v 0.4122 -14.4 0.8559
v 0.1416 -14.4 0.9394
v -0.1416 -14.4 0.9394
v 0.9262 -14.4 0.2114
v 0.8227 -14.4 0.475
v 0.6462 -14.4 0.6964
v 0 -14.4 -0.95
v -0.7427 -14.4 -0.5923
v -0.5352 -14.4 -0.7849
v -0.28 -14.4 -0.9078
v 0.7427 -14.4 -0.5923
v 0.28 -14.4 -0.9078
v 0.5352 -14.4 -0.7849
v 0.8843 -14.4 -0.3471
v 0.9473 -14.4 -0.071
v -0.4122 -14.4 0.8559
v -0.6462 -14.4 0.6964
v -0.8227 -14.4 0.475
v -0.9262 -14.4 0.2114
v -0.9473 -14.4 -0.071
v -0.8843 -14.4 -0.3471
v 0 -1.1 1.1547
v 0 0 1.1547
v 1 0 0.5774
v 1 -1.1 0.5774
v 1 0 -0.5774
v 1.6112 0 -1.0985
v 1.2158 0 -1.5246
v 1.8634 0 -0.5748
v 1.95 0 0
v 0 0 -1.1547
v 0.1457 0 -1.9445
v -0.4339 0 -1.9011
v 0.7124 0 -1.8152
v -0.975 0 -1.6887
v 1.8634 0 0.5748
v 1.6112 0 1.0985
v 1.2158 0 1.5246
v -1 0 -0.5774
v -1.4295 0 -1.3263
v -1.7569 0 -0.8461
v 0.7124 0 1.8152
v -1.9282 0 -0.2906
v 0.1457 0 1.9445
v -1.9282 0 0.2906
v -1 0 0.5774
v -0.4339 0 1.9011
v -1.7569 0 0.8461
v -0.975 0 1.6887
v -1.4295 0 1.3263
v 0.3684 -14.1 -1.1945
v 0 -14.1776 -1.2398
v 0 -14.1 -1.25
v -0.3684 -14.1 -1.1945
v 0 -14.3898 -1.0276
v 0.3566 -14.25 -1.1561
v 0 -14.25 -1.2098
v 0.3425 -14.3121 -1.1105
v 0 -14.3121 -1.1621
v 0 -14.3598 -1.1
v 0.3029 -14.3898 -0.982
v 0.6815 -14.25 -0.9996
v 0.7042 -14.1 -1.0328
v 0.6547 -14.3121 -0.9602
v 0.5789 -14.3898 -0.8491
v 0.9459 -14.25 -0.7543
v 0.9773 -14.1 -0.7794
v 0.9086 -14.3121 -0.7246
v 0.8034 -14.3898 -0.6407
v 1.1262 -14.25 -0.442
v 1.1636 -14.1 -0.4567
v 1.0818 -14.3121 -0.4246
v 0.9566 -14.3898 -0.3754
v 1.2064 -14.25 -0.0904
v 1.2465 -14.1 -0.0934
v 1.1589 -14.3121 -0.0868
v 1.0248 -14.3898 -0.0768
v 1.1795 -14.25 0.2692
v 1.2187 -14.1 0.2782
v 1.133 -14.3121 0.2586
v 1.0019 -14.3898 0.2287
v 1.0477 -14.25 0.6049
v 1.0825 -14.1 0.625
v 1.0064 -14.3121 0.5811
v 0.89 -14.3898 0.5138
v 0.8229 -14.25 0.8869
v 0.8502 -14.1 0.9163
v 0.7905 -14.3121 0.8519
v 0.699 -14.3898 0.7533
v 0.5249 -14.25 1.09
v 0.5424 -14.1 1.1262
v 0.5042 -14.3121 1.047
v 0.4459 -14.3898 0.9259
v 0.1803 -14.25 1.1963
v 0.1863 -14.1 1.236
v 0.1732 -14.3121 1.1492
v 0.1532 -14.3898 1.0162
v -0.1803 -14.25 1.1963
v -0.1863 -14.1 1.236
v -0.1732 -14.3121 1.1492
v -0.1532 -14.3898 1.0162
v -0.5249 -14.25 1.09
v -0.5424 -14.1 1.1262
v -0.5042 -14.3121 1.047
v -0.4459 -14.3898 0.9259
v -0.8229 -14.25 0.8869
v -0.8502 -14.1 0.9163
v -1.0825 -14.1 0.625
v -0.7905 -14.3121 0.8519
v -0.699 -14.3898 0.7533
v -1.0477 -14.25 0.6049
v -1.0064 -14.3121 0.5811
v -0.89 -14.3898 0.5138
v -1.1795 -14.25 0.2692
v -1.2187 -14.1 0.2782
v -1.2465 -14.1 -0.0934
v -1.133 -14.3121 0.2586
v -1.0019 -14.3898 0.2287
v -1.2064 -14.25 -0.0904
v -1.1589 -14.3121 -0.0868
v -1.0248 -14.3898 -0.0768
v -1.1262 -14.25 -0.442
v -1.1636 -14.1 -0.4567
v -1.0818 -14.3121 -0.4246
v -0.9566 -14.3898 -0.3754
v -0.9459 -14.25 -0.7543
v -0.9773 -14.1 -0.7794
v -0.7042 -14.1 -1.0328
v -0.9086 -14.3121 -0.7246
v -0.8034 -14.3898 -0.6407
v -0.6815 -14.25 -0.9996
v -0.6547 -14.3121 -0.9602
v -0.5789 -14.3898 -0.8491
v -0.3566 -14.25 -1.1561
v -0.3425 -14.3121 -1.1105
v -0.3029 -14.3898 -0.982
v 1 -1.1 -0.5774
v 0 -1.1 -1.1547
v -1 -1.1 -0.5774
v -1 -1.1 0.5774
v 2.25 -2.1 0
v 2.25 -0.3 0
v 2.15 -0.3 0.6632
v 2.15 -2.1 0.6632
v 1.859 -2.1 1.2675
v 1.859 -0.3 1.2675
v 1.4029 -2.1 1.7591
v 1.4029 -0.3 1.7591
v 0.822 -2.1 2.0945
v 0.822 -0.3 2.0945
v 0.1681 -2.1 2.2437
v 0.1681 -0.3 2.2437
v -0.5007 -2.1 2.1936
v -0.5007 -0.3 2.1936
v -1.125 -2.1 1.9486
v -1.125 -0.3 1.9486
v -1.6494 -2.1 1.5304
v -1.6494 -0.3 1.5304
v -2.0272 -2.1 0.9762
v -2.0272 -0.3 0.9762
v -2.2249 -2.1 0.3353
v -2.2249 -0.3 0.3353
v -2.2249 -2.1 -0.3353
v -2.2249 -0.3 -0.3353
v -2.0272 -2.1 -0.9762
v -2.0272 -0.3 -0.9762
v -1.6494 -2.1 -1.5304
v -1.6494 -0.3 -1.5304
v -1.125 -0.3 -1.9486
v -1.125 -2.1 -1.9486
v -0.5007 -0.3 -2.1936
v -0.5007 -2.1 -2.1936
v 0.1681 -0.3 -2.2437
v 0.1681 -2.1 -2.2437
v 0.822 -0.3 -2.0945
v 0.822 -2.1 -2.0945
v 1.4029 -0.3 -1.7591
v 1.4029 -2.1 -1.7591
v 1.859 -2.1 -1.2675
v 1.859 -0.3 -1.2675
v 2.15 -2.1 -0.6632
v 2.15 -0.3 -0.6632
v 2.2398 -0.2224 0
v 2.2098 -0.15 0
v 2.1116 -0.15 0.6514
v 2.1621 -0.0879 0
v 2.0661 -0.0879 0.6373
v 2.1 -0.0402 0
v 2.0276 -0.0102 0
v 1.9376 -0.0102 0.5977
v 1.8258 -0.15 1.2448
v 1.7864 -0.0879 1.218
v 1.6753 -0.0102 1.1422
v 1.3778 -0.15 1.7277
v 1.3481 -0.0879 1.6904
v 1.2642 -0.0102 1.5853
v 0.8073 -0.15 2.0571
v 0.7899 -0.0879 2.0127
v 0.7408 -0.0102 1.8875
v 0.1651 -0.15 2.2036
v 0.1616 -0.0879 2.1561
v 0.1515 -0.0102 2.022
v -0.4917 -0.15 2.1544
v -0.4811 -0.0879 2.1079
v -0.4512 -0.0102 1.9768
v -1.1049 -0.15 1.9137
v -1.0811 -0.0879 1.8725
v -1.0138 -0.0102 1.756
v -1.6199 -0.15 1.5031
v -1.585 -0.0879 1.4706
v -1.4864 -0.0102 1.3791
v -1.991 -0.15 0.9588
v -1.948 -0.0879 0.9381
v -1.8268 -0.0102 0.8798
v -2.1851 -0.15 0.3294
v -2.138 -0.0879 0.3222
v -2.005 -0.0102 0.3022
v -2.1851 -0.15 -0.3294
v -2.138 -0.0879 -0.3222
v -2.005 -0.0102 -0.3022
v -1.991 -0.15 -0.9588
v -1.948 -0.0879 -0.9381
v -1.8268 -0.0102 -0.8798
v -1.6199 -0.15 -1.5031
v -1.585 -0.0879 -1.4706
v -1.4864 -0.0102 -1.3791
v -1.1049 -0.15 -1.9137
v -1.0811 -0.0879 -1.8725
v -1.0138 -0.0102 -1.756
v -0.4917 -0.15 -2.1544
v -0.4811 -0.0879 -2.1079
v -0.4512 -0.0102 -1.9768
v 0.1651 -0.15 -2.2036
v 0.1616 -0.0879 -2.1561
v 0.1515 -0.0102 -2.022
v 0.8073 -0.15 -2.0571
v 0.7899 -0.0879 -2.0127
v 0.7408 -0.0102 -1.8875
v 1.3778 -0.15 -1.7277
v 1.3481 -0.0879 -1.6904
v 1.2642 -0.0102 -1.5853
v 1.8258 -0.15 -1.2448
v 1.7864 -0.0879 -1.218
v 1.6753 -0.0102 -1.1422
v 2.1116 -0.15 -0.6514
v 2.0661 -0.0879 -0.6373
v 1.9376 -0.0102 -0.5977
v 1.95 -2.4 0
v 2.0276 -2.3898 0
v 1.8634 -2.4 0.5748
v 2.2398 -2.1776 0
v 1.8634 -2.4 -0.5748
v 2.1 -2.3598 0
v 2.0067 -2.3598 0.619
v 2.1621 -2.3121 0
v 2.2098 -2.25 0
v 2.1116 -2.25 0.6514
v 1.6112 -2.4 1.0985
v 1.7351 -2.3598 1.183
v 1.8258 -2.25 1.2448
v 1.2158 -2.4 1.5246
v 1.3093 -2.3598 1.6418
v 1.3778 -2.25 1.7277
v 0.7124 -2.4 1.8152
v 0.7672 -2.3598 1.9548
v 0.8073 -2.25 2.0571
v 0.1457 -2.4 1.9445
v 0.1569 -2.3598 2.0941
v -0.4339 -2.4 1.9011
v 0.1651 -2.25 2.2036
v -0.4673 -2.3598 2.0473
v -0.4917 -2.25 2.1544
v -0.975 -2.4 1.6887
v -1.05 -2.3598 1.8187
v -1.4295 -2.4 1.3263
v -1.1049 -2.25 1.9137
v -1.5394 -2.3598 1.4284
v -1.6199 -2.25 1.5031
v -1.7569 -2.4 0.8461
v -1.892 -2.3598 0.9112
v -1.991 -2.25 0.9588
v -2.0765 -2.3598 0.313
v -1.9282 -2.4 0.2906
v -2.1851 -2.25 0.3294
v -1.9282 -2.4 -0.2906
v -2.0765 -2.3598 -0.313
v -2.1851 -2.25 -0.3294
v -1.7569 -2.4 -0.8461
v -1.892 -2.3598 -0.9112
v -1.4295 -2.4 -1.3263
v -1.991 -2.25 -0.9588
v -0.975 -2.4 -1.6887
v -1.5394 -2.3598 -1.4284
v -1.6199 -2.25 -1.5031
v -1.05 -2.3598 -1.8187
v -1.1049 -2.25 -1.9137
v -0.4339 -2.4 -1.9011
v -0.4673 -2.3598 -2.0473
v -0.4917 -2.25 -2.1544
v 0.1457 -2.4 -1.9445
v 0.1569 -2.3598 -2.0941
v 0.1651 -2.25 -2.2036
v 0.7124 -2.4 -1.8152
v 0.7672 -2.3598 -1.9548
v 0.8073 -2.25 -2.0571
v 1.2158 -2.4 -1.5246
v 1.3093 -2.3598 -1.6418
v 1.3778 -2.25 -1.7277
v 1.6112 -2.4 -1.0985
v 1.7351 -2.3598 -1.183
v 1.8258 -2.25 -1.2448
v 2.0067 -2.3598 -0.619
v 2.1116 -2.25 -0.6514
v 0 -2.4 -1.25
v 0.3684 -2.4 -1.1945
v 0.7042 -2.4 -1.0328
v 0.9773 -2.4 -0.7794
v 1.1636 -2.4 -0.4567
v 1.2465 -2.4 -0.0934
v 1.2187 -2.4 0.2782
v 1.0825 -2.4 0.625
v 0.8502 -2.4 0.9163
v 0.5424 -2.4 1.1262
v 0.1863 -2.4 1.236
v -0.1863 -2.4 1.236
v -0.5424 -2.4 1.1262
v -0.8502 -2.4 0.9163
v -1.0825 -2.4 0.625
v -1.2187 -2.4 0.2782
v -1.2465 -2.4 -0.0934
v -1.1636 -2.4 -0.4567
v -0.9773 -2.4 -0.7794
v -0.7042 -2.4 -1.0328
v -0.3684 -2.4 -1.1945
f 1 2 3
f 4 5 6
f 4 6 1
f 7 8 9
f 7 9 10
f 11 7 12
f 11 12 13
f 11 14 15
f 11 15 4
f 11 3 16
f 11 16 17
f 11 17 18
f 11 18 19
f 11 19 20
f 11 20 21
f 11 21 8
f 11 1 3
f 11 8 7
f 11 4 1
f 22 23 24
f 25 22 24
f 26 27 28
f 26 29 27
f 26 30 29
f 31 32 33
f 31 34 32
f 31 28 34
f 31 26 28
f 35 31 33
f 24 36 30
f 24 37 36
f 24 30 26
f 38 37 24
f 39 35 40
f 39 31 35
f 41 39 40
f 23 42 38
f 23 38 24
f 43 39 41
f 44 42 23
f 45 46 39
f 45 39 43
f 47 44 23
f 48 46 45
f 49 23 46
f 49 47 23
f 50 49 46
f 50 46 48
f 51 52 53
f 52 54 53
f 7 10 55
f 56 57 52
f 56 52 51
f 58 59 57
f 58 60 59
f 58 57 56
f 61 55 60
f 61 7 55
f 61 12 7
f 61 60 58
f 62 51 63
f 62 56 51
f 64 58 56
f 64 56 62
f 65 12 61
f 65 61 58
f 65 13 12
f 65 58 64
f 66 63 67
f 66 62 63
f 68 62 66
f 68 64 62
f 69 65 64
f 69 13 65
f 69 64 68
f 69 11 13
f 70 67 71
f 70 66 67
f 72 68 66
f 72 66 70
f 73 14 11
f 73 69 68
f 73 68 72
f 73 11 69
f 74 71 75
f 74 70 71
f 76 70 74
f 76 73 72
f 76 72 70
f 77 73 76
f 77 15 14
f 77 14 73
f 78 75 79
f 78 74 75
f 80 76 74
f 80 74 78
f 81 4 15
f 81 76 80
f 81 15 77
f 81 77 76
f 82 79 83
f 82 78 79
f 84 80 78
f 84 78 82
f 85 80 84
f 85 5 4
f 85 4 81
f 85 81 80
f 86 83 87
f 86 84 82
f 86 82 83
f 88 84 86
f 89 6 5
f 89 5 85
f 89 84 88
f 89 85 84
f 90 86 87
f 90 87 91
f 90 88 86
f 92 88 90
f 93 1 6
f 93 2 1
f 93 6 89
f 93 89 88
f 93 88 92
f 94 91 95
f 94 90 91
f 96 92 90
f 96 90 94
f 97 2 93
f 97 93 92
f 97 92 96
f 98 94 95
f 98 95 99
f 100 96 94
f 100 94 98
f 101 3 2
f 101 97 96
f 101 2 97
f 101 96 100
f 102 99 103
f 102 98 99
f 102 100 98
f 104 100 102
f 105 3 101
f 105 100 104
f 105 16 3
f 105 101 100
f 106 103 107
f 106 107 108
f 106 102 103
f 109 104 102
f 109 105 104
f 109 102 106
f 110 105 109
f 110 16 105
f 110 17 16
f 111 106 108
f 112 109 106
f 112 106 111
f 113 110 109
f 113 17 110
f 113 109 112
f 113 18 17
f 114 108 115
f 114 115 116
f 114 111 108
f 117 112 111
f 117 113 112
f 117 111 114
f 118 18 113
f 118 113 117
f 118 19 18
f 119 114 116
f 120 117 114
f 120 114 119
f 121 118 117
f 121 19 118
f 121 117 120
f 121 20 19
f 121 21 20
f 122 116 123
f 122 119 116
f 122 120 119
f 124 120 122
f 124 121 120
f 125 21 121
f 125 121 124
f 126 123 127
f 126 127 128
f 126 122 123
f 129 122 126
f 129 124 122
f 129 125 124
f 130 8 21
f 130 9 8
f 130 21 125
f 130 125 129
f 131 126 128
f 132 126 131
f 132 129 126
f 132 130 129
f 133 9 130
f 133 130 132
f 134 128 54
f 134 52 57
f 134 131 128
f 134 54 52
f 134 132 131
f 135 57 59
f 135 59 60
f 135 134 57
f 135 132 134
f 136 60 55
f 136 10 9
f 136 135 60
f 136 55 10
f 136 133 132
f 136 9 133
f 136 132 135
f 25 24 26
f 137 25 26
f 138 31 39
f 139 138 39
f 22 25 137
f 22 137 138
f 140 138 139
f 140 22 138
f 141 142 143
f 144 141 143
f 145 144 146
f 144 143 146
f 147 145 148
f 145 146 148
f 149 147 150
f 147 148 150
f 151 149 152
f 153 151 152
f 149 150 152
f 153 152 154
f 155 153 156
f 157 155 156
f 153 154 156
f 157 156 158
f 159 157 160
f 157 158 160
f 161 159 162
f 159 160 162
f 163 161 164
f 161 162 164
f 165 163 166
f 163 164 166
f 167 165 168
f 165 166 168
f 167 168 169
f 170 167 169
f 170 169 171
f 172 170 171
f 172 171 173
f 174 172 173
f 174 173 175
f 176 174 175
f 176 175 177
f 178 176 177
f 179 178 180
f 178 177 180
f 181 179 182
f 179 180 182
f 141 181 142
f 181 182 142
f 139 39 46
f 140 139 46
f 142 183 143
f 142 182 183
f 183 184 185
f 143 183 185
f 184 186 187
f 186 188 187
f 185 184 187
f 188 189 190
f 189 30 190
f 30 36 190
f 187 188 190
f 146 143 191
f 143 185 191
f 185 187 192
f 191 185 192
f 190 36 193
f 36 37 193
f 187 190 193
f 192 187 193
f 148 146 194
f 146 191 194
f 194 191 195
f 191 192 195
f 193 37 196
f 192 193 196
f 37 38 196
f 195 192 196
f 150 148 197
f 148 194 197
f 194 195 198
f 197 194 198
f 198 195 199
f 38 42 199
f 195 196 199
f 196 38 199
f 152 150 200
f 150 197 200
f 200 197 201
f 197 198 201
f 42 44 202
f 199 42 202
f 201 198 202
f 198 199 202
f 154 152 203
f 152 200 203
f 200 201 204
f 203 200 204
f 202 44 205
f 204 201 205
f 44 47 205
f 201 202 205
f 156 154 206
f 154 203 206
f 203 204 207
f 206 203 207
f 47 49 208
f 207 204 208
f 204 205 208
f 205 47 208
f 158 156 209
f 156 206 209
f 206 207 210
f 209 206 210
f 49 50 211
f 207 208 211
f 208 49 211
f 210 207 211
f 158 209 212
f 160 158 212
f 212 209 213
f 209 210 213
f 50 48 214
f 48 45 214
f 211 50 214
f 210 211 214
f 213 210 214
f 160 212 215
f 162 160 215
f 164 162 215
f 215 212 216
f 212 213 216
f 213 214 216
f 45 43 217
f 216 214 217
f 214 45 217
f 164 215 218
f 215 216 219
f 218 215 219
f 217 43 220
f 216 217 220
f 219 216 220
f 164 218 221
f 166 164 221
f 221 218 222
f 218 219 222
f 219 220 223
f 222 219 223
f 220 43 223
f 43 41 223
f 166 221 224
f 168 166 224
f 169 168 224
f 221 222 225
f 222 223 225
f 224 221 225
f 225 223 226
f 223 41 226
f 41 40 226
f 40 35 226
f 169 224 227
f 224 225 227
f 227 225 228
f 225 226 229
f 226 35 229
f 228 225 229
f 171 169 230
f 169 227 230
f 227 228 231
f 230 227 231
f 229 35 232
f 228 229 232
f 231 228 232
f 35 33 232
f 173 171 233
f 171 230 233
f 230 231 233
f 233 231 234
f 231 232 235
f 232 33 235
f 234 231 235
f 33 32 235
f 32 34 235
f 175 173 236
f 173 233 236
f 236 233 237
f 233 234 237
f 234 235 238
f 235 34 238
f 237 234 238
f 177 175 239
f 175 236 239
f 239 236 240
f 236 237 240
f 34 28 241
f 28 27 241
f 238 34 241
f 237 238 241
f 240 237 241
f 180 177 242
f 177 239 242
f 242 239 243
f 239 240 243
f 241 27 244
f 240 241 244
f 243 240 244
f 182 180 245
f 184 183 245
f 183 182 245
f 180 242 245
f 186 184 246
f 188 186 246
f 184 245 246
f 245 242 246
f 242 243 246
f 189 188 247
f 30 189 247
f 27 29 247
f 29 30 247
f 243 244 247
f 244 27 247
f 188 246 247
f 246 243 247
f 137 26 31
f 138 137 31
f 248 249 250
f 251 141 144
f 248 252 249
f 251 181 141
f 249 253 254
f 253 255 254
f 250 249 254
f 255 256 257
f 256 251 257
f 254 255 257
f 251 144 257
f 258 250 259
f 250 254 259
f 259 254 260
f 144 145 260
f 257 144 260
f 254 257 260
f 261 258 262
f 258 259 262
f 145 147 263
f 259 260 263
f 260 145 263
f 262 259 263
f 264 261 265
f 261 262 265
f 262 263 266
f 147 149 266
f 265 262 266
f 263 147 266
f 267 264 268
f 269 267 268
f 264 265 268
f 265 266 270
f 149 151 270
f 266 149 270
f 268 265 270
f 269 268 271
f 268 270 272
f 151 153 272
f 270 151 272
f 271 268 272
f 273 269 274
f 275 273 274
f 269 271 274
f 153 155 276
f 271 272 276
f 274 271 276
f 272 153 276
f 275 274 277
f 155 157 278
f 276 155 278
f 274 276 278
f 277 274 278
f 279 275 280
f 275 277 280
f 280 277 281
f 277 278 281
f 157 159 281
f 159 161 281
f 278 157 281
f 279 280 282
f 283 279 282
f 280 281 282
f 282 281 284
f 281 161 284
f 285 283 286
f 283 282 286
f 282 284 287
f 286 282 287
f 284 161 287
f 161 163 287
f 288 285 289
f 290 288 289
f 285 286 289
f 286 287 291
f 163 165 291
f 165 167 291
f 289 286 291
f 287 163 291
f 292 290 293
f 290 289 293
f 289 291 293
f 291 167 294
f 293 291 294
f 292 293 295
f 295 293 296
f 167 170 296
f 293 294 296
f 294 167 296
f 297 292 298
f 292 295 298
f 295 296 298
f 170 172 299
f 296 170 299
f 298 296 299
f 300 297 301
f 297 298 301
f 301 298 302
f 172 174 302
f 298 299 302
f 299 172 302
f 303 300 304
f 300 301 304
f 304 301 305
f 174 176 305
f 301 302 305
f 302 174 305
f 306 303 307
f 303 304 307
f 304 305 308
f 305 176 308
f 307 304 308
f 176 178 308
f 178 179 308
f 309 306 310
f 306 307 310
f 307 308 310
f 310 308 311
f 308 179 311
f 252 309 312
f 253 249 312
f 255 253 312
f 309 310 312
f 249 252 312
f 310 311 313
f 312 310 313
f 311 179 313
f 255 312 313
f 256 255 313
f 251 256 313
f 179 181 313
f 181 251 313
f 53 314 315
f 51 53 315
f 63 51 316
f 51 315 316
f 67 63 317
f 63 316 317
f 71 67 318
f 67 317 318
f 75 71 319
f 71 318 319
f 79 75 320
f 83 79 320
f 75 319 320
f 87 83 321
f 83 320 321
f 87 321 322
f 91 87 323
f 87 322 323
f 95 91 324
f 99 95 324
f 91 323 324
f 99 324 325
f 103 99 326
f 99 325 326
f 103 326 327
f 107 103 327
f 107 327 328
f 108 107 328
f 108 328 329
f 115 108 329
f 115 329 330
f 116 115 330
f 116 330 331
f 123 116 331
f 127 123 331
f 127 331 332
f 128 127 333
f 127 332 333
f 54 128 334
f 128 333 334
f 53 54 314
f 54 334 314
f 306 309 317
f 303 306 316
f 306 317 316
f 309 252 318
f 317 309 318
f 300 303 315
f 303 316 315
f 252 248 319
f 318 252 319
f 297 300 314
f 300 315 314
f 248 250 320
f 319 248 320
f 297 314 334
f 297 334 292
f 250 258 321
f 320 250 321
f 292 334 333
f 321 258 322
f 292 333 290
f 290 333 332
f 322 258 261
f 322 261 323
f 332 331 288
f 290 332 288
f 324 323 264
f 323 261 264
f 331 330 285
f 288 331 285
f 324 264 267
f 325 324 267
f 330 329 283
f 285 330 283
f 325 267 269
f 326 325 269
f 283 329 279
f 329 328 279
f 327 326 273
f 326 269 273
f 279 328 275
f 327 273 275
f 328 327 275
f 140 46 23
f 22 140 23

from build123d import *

# Parameters (mm, degrees)
SKETCH_1_W          = 2.25
SKETCH_1_H          = 2.4
SKETCH_2_R          = 1.25
EXTRUDE_1_DEPTH     = 12
CUT_EXTRUDE_1_DEPTH = 1.1
FILLET_1_R          = 0.3


with BuildPart() as part:
    # 草图1 → 旋转1 (revolve)
    with BuildSketch(Plane.XY):
        with Locations((1.125, -1.2)):
            Rectangle(SKETCH_1_W, SKETCH_1_H)
    revolve(axis=Axis((0, 0, 0), (0, -1, 0)))

    # 草图2 → 凸台-拉伸1 (add)
    with BuildSketch(Plane.XZ.offset(2.4)):
        with Locations(Location((0, 0, 0), (0, 0, 270))):
            Circle(SKETCH_2_R)
    extrude(amount=EXTRUDE_1_DEPTH)

    # 草图3 → 切除-拉伸1 (cut)
    with BuildSketch(Plane(origin=(0, 0, 0), x_dir=(-1, 0, 0), z_dir=(0, 1, 0))):
        Polygon((0, -1.154700538), (1, -0.577350269), (1, 0.577350269), (0, 1.154700538), (-1, 0.577350269), (-1, -0.577350269), align=None)
    extrude(amount=-CUT_EXTRUDE_1_DEPTH, mode=Mode.SUBTRACT)

    # 圆角1
    fillet_1_edges = [part.edges().sort_by_distance(p)[0] for p in [
        (0, -14.4, 1.25),
        (-2.25, -2.4, 0),
        (-2.25, 0, 0),
    ]]
    fillet(fillet_1_edges, radius=FILLET_1_R)


solid = part.part
